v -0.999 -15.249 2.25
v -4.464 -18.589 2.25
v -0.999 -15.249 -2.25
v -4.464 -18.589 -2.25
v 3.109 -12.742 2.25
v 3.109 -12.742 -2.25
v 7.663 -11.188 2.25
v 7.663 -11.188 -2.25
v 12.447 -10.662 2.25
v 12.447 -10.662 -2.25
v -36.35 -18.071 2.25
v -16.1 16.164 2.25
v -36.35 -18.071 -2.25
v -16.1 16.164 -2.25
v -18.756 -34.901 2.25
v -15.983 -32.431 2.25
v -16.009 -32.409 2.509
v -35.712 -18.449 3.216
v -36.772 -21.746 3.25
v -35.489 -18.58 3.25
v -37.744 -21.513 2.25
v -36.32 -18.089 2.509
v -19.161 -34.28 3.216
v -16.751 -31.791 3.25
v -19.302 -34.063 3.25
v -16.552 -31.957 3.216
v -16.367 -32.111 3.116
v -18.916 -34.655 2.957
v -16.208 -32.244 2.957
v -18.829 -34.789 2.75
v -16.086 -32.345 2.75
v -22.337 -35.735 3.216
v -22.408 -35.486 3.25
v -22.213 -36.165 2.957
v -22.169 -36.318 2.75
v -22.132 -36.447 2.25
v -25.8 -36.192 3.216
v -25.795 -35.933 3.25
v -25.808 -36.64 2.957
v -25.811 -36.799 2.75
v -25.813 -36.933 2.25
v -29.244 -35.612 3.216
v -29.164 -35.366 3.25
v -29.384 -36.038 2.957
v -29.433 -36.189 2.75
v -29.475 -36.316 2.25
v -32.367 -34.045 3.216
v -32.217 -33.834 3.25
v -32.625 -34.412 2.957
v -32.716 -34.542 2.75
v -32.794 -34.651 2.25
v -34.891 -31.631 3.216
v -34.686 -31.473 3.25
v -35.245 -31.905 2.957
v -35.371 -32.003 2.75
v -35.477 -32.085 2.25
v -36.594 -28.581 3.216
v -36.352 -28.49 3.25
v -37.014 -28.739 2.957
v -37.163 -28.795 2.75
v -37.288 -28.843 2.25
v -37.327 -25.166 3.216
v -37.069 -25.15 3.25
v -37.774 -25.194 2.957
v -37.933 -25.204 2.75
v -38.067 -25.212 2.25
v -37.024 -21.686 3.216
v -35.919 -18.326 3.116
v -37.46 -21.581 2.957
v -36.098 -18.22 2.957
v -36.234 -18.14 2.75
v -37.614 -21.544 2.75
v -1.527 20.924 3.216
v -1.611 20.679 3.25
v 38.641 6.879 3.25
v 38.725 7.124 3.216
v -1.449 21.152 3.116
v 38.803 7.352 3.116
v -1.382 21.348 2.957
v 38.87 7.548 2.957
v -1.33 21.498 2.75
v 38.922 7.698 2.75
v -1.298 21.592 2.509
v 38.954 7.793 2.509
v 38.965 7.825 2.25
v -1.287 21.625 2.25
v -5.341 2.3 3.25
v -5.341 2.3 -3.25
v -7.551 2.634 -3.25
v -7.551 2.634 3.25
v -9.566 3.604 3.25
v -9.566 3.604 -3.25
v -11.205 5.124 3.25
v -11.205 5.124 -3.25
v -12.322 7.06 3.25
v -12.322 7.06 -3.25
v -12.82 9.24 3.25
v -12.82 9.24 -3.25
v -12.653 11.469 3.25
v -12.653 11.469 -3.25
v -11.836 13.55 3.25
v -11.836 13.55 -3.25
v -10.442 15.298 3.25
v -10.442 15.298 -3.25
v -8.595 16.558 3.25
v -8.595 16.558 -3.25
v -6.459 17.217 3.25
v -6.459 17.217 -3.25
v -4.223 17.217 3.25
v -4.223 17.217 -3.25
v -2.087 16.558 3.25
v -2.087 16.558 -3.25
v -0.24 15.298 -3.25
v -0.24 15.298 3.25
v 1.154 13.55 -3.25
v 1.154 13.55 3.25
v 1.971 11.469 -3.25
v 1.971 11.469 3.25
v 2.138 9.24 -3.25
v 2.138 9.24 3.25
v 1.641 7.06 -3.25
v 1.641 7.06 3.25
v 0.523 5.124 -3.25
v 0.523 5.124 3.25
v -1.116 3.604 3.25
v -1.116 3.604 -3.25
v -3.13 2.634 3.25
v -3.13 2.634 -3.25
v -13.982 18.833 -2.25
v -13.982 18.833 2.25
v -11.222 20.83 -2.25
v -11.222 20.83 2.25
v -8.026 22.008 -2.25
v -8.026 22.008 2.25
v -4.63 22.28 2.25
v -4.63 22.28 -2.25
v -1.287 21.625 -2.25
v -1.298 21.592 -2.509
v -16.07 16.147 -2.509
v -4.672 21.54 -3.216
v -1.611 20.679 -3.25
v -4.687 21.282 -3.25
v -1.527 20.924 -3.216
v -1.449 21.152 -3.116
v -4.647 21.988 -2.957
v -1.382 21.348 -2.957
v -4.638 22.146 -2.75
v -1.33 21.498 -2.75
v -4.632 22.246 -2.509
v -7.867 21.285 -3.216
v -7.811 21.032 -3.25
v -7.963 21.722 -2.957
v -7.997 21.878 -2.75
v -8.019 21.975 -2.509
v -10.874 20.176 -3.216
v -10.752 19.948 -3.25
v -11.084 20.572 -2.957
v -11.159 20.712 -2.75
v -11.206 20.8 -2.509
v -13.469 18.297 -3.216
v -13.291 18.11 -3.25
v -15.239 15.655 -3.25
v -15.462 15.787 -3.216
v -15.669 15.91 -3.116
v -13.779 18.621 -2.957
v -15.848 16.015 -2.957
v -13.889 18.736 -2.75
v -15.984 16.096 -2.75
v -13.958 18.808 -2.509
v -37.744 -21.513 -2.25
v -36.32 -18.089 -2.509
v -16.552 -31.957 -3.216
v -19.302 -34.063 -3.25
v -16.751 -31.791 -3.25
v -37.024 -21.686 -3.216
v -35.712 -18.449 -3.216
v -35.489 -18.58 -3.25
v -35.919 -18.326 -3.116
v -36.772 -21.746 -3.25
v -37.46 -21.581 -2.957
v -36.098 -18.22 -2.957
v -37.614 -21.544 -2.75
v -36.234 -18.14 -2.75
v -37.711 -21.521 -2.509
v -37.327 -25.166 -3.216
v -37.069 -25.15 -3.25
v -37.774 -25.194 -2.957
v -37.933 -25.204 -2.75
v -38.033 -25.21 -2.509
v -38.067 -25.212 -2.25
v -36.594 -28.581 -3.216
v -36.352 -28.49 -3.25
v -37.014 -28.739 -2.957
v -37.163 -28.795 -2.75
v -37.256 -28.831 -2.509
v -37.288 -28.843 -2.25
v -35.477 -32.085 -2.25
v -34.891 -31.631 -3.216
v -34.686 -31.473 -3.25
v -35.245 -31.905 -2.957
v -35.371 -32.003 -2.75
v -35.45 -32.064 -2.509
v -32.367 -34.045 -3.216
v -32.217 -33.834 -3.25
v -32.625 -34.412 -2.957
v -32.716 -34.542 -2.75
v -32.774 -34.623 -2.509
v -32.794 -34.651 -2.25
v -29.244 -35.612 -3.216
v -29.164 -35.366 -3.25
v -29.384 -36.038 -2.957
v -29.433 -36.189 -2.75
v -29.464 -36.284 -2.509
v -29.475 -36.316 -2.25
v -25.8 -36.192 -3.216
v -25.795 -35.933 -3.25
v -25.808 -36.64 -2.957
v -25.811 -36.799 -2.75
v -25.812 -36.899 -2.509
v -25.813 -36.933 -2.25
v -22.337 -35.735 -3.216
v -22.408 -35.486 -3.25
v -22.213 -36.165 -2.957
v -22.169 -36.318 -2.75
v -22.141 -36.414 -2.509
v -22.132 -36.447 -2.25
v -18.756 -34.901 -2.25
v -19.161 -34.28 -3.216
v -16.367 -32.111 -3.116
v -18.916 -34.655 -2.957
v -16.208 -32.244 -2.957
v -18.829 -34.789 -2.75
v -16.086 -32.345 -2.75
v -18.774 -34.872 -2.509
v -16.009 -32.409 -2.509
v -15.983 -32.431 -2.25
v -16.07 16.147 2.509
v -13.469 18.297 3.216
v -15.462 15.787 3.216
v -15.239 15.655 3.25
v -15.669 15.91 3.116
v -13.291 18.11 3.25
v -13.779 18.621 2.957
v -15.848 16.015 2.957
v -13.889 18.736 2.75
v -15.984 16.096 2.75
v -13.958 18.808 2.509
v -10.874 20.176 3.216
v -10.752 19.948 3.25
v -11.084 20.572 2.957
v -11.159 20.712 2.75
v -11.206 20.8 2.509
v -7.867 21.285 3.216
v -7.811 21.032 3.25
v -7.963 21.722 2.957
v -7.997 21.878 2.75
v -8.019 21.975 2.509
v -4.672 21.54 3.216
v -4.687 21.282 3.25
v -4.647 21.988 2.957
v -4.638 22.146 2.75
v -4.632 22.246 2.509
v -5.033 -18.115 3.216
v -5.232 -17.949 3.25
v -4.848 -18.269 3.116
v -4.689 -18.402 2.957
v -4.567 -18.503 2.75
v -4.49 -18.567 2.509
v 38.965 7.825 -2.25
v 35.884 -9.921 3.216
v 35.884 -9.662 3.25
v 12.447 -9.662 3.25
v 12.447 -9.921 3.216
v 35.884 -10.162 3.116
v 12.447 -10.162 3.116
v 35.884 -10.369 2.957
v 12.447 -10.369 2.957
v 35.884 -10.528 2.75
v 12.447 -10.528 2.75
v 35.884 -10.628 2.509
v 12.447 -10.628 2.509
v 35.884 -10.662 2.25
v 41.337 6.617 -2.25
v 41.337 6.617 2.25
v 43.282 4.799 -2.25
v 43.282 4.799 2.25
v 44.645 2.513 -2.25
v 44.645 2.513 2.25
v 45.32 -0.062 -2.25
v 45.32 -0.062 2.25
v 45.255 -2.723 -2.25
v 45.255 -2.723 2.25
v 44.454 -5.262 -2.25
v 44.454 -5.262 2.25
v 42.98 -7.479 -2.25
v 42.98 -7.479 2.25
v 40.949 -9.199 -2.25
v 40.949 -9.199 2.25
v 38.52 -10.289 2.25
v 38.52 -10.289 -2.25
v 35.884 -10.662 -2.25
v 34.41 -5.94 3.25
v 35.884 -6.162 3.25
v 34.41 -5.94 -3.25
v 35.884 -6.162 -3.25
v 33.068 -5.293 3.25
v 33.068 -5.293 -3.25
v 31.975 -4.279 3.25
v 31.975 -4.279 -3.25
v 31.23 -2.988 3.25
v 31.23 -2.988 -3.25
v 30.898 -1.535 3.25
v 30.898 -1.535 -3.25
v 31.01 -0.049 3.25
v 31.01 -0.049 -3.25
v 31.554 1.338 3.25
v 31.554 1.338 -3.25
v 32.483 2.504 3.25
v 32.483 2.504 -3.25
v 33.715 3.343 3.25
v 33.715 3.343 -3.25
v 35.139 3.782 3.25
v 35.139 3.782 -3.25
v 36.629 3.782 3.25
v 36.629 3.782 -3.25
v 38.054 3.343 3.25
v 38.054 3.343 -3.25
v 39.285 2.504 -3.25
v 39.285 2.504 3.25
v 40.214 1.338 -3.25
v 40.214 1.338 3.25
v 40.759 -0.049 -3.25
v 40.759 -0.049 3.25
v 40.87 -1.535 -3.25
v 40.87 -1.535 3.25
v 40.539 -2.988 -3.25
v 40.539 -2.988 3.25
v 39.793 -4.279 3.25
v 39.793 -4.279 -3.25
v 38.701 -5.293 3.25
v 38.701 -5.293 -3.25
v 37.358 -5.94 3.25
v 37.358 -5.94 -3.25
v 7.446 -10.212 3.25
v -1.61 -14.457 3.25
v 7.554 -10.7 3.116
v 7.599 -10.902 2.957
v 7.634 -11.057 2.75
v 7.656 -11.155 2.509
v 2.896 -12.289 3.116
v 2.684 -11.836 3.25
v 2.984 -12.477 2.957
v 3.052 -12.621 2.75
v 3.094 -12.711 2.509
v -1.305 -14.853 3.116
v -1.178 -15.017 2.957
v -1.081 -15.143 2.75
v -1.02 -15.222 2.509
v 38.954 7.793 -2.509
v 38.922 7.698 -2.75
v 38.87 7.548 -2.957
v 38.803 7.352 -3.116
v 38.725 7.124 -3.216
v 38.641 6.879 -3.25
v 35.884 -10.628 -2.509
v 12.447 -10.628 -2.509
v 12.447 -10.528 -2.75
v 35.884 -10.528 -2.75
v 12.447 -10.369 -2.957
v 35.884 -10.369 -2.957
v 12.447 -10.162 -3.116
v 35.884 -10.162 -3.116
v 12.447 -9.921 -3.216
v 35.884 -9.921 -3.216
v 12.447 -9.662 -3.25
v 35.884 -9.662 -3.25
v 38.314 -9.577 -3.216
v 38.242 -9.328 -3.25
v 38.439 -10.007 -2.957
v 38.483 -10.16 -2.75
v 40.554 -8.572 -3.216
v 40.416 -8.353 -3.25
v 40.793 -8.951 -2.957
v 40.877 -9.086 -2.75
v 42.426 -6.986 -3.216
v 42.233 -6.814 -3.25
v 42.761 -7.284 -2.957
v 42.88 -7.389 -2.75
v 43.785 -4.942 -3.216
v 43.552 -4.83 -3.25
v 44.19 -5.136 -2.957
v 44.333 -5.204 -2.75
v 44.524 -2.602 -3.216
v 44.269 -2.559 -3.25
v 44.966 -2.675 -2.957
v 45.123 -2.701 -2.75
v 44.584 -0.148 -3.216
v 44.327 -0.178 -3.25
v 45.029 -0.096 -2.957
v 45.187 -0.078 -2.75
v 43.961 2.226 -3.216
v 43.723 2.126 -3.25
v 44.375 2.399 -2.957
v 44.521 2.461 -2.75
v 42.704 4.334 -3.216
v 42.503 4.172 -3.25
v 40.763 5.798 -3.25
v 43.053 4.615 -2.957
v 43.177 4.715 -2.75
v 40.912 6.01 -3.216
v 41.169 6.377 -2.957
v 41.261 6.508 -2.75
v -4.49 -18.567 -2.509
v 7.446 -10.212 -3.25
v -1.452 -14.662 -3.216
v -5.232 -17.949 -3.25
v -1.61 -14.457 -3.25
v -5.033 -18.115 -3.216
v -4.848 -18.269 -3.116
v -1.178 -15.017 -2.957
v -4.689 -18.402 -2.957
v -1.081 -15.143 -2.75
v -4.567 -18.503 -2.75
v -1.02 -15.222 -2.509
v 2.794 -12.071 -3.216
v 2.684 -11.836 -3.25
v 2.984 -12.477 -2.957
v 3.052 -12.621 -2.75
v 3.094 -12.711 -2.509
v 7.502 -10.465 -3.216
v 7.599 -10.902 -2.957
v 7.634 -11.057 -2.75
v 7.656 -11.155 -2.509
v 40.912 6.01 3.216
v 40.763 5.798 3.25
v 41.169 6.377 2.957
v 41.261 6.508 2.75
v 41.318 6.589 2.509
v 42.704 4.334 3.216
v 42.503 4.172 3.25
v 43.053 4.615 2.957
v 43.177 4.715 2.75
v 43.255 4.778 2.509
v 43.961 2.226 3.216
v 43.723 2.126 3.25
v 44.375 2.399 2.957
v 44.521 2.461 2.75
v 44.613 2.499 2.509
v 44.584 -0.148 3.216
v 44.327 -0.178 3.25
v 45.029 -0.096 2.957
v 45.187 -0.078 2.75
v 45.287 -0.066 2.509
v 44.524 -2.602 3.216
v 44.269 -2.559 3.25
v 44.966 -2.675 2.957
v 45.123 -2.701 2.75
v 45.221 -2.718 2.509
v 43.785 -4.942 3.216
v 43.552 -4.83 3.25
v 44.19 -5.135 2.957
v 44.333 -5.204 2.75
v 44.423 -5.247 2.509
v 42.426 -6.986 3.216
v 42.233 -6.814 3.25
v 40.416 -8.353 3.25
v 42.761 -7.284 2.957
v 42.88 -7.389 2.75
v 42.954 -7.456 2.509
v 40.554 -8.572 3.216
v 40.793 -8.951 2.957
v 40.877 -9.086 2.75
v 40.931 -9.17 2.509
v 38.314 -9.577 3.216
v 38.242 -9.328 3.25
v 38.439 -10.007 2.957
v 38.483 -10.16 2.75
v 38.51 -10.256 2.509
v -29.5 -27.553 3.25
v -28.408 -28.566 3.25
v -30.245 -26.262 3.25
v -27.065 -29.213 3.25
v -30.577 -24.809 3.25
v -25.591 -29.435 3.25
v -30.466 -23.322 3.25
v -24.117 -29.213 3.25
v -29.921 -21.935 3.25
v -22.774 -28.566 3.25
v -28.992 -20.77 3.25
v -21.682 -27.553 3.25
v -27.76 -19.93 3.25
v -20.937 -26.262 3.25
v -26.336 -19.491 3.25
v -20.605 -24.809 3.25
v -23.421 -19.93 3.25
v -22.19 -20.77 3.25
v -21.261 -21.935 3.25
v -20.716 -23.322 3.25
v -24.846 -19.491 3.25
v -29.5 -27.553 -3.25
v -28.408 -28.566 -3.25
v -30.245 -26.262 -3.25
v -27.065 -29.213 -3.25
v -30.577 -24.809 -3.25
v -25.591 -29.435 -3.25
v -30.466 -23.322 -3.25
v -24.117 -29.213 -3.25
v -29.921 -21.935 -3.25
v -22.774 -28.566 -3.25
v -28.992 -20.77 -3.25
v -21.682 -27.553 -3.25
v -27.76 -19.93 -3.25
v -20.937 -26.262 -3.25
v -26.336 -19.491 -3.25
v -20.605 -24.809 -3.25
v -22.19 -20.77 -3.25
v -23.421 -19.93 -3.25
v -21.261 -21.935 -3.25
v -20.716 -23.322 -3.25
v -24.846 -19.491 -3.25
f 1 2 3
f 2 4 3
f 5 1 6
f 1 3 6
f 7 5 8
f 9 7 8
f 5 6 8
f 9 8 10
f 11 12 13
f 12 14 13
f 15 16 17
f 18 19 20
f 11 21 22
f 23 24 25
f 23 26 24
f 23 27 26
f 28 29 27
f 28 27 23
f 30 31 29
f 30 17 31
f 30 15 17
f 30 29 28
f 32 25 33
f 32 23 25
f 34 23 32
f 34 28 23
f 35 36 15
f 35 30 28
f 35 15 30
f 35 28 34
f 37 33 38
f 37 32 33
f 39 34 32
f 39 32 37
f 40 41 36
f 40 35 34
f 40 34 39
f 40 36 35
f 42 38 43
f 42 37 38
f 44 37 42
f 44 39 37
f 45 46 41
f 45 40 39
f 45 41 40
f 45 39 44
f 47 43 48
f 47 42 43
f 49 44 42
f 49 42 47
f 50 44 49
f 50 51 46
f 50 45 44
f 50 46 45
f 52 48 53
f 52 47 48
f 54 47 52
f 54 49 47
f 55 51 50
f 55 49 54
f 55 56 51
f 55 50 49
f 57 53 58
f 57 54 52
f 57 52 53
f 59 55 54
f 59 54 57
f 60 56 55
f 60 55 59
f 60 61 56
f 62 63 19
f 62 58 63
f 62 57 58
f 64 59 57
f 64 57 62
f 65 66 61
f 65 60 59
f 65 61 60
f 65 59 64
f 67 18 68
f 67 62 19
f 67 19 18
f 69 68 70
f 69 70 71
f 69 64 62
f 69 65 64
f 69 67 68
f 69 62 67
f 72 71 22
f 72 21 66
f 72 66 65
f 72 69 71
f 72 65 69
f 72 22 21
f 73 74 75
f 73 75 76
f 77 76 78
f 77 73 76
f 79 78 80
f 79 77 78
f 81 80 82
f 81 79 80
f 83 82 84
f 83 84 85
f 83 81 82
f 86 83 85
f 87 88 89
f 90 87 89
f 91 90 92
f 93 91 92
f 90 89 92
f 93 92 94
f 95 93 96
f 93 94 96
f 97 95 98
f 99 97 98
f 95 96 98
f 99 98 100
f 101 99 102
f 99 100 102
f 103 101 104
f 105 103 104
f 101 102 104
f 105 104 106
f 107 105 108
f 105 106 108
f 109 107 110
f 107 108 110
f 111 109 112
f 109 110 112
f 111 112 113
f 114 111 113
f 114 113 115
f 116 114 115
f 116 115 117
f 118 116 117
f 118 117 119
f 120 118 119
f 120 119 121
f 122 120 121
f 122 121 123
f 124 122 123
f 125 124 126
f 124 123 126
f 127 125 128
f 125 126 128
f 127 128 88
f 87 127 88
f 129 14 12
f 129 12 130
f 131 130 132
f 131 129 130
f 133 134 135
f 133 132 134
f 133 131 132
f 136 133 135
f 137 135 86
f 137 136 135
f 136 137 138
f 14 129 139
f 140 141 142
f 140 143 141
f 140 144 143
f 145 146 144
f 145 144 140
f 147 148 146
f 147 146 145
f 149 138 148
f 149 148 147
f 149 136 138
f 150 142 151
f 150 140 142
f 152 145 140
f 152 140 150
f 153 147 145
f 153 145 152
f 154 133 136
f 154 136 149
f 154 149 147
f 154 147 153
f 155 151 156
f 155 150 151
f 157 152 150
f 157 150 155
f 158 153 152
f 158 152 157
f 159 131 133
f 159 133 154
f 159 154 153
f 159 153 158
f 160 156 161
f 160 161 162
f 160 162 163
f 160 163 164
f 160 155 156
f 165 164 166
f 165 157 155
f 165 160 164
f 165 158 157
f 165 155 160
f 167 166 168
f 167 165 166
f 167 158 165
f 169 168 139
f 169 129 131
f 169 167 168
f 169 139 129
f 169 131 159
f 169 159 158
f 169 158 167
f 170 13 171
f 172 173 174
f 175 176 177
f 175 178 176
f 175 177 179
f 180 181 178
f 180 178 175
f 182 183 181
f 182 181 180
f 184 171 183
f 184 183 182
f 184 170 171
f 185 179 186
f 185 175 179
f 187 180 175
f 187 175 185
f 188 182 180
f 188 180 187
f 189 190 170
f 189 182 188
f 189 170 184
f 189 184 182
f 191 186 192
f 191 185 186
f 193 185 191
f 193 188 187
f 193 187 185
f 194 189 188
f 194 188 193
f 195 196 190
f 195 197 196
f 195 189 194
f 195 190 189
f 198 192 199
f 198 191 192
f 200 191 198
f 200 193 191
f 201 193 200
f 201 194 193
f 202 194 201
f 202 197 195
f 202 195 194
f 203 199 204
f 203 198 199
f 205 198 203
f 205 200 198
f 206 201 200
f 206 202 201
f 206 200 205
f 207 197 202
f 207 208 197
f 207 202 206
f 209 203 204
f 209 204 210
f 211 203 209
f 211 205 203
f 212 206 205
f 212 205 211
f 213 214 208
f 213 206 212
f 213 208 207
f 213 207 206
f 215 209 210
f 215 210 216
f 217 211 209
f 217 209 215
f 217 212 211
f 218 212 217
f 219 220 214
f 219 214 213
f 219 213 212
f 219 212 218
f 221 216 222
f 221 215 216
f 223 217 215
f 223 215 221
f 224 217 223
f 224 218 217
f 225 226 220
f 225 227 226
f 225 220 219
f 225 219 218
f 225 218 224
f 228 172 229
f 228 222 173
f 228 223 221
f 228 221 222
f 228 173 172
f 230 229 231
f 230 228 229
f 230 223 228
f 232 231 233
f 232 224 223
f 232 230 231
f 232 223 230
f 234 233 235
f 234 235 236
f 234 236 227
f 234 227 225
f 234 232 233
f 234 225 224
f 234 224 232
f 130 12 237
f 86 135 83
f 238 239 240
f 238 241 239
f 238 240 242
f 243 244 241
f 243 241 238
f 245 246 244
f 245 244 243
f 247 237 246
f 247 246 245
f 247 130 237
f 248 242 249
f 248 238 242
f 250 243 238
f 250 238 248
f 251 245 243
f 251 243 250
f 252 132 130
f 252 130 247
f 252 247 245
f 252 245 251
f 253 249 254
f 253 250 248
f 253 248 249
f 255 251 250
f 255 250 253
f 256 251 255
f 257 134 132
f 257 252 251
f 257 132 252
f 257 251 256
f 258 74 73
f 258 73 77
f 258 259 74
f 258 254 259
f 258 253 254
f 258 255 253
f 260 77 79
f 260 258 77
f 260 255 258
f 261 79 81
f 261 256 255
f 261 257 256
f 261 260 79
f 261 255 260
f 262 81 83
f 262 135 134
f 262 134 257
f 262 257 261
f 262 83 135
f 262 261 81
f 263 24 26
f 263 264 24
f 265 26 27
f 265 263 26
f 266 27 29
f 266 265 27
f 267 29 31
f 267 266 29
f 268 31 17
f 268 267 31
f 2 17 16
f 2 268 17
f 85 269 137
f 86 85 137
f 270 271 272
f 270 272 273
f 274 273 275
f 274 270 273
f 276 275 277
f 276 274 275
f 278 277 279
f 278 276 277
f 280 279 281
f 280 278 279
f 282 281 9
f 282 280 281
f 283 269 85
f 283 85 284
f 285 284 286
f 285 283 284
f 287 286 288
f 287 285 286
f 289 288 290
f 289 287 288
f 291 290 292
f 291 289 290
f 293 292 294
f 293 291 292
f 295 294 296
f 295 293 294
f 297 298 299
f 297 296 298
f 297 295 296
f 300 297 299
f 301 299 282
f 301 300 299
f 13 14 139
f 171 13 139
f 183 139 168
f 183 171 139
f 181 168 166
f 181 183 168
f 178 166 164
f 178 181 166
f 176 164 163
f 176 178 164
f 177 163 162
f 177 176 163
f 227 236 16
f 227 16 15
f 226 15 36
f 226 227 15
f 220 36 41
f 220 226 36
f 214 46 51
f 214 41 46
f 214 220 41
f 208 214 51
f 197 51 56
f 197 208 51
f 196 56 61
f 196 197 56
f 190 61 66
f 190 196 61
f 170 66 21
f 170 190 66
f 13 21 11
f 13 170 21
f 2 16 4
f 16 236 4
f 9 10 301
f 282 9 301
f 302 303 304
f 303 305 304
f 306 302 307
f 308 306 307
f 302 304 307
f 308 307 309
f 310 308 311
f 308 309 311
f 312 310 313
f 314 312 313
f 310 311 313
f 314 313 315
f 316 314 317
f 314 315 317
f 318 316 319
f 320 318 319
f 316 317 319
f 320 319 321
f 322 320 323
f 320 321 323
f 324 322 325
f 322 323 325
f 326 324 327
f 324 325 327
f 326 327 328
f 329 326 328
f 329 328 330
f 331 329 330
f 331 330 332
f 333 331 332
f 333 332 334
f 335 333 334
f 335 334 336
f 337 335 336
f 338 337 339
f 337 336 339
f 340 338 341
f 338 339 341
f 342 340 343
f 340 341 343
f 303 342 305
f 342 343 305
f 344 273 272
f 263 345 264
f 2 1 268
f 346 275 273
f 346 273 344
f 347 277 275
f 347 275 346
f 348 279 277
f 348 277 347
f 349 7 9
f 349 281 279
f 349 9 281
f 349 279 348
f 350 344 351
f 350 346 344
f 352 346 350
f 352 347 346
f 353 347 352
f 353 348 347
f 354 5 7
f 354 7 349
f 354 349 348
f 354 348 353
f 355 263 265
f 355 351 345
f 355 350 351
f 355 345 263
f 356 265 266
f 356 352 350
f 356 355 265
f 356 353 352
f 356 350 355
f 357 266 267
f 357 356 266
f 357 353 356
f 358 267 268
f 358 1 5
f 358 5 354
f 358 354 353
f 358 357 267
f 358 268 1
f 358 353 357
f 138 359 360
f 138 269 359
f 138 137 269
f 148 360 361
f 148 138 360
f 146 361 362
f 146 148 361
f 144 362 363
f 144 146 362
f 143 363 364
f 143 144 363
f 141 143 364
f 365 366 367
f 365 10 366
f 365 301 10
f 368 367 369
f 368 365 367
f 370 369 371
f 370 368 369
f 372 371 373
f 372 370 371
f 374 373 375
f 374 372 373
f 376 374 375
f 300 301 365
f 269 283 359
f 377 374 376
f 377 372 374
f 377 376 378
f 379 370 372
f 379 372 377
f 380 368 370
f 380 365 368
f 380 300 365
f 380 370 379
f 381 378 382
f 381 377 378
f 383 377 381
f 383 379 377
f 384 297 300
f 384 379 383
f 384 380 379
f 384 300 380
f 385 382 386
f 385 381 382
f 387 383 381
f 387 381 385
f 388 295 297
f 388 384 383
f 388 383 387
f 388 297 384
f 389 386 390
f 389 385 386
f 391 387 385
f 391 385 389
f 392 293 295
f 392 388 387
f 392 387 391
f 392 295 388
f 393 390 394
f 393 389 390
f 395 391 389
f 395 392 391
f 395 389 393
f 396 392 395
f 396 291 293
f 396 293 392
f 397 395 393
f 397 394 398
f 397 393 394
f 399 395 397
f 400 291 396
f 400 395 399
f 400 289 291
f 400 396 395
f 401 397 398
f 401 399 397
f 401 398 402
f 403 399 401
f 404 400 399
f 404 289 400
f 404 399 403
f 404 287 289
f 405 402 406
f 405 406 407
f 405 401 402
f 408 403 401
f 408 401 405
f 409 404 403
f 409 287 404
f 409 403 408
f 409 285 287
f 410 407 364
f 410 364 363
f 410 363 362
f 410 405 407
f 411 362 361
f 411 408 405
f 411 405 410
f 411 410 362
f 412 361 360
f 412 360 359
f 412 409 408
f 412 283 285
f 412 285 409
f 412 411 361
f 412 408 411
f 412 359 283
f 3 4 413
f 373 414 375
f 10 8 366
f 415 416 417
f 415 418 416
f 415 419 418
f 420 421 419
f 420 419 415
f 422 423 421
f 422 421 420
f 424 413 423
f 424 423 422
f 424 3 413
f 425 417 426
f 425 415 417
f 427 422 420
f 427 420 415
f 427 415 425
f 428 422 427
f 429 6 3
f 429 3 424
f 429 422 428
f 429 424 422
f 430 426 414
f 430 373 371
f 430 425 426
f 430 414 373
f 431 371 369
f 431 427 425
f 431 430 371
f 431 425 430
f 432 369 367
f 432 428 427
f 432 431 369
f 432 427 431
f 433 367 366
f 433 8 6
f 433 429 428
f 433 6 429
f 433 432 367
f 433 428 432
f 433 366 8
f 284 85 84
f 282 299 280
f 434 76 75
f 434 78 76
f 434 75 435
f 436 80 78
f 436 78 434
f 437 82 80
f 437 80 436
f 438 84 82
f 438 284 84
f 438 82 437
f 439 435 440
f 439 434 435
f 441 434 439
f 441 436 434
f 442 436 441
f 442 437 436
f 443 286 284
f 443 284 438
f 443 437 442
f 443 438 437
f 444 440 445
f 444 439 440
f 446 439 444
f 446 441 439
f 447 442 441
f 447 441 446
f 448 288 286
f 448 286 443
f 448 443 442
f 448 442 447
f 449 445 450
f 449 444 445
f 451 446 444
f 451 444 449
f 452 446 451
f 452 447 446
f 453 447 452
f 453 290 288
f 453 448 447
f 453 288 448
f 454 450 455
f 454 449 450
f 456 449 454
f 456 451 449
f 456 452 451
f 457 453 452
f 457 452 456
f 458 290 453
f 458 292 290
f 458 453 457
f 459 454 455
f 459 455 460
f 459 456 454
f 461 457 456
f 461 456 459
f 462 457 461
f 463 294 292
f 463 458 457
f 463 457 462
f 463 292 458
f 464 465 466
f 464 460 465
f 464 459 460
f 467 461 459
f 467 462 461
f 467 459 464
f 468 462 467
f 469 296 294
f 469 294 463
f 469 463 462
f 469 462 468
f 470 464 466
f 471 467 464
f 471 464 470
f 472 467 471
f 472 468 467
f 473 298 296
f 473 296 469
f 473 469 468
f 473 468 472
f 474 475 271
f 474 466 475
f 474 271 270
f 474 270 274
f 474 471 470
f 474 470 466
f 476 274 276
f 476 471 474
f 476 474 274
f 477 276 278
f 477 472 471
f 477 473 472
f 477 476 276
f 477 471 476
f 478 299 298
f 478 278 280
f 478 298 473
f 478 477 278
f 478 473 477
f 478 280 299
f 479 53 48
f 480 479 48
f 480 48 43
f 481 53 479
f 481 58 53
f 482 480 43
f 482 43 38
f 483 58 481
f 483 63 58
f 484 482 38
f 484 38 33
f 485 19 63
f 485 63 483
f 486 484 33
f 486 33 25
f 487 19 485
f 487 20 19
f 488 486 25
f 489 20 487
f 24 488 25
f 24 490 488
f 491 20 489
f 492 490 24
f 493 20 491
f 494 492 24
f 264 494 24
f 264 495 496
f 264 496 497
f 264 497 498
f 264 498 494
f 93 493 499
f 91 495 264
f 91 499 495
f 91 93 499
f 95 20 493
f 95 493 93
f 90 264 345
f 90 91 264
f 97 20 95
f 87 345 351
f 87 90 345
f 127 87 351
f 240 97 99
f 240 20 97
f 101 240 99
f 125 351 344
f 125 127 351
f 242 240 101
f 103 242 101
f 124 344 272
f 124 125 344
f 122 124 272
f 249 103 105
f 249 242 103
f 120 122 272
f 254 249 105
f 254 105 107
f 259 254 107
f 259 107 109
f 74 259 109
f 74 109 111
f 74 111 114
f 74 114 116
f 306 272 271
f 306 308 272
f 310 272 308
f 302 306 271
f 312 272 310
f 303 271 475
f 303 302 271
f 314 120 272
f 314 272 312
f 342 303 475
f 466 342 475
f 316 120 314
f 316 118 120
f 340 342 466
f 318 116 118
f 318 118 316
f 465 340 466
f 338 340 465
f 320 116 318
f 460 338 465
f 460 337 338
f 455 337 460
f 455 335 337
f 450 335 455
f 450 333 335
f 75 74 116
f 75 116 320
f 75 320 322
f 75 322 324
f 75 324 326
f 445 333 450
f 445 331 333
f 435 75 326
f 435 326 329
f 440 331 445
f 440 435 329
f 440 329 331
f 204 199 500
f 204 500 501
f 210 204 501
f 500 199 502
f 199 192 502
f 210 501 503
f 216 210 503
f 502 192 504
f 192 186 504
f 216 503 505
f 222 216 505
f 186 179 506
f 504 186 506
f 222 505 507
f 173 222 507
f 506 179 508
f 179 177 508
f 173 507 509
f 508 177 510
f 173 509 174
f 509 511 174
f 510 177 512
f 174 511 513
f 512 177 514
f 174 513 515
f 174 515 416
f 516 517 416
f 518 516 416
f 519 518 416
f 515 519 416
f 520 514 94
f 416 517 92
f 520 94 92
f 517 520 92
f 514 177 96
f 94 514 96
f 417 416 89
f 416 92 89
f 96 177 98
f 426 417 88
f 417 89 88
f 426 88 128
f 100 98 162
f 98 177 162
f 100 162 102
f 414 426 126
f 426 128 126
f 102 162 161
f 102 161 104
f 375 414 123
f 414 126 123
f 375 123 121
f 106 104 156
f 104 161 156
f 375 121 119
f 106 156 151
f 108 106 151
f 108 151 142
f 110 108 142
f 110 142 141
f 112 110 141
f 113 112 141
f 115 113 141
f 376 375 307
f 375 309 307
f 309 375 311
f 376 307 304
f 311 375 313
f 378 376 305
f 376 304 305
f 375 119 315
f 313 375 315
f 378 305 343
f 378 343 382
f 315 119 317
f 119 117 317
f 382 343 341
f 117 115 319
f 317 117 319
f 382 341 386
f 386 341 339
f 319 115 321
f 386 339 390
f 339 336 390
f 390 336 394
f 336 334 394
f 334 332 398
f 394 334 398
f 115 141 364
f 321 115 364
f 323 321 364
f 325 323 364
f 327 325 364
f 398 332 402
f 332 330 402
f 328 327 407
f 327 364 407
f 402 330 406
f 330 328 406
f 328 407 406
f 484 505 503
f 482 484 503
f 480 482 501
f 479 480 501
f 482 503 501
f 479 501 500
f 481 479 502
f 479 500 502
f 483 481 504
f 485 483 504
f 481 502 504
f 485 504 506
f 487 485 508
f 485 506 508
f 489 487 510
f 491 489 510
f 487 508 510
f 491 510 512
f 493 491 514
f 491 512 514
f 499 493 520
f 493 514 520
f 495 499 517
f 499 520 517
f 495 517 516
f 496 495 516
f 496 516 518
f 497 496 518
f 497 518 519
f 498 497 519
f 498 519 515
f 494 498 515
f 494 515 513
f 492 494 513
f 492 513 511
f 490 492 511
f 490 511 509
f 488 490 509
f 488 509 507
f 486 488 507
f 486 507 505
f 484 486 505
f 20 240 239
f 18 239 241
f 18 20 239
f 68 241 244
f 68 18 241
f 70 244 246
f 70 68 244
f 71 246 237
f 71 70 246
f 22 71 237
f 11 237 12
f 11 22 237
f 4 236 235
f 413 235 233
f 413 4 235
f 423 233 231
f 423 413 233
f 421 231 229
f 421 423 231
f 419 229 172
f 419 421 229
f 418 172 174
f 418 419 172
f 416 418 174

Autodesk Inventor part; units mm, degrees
ref_plane "YZ Plane" through (0, 0, 0) normal (1, 0, 0) x (0, 1, 0)
ref_plane "XZ Plane" through (0, 0, 0) normal (0, 1, 0) x (-1, 0, 0)
ref_plane "XY Plane" through (0, 0, 0) normal (0, 0, 1) x (1, 0, 0)
sketch "Sketch1" plane through (0, 0, 0) normal (0, 0, 1) x (1, 0, 0)
  arc A0 (-36.3497, -18.0713) -> (-15.9827, -32.4309) centre (-25.5909, -24.4351) ccw
  arc A1 (35.8842, -10.6617) -> (38.9651, 7.8249) centre (35.8842, -1.1617) ccw
  arc A2 (-1.287, 21.6247) -> (-16.0996, 16.1641) centre (-5.3408, 9.8003) ccw
  arc A3 (12.4467, -10.6617) -> (-4.4637, -18.5891) centre (12.4467, -32.6617) ccw
  line L0 (-15.9827, -32.4309) -> (-4.4637, -18.5891)
  line L1 (12.4467, -10.6617) -> (35.8842, -10.6617)
  line L2 (38.9651, 7.8249) -> (-1.287, 21.6247)
  line L3 (-16.0996, 16.1641) -> (-36.3497, -18.0713)
  dimension "d0" = 12.5
  dimension "d1" = 9.5
  dimension "d2" = 12.5
  dimension "d3" = 22
extrude "Extrusion1" add sketch "Sketch1" along normal mid plane 6.5
sketch "Sketch2" plane through (0, 0, 3.25) normal (0, 0, 1) x (1, 0, 0)
  arc A0 (-36.3497, -18.0713) -> (-15.9827, -32.4309) centre (-25.5909, -24.4351) ccw projected
  arc A1 (-1.287, 21.6247) -> (-16.0996, 16.1641) centre (-5.3408, 9.8003) ccw projected
  arc A2 (35.8842, -10.6617) -> (38.9651, 7.8249) centre (35.8842, -1.1617) ccw projected
  line L0 (-36.3497, -18.0713) -> (-16.0996, 16.1641) projected
  line L1 (-4.4637, -18.5891) -> (-15.9827, -32.4309) projected
  arc A3 (12.4467, -10.6617) -> (-4.4637, -18.5891) centre (12.4467, -32.6617) ccw projected
  line L2 (35.8842, -10.6617) -> (12.4467, -10.6617) projected
  line L3 (-1.287, 21.6247) -> (38.9651, 7.8249) projected
hole "Hole1" at (-25.5909, -24.4351, 3.25) direction (0, 0, -1) diameter 10 end through all
sketch "Sketch3" plane through (0, 0, 3.25) normal (0, 0, 1) x (1, 0, 0)
  arc A0 (-1.287, 21.6247) -> (-16.0996, 16.1641) centre (-5.3408, 9.8003) ccw projected
hole "Hole2" at (-5.3408, 9.8003, 3.25) direction (0, 0, -1) diameter 15 end through all
sketch "Sketch4" plane through (0, 0, 3.25) normal (0, 0, 1) x (1, 0, 0)
  arc A0 (35.8842, -10.6617) -> (38.9651, 7.8249) centre (35.8842, -1.1617) ccw projected
hole "Hole3" at (35.8842, -1.1617, 3.25) direction (0, 0, -1) diameter 10 end through all
fillet "Fillet1" radius 1 16 edges at (18.8391, 14.7248, 3.25) (45.2549, -2.7234, 3.25) (24.1654, -10.6617, 3.25) (3.1086, -12.7419, 3.25) (-10.2232, -25.51, 3.25) (-32.7937, -34.6512, 3.25) (-26.2246, -0.9536, 3.25) (-9.6644, 21.5287, 3.25) (18.8391, 14.7248, -3.25) (-9.6644, 21.5287, -3.25) (-26.2246, -0.9536, -3.25) (-32.7937, -34.6512, -3.25) (-10.2232, -25.51, -3.25) (3.1086, -12.7419, -3.25) (24.1654, -10.6617, -3.25) (45.2549, -2.7234, -3.25)
properties part number "Bracket - Optimization - Copy" material "Aluminum 6061"
